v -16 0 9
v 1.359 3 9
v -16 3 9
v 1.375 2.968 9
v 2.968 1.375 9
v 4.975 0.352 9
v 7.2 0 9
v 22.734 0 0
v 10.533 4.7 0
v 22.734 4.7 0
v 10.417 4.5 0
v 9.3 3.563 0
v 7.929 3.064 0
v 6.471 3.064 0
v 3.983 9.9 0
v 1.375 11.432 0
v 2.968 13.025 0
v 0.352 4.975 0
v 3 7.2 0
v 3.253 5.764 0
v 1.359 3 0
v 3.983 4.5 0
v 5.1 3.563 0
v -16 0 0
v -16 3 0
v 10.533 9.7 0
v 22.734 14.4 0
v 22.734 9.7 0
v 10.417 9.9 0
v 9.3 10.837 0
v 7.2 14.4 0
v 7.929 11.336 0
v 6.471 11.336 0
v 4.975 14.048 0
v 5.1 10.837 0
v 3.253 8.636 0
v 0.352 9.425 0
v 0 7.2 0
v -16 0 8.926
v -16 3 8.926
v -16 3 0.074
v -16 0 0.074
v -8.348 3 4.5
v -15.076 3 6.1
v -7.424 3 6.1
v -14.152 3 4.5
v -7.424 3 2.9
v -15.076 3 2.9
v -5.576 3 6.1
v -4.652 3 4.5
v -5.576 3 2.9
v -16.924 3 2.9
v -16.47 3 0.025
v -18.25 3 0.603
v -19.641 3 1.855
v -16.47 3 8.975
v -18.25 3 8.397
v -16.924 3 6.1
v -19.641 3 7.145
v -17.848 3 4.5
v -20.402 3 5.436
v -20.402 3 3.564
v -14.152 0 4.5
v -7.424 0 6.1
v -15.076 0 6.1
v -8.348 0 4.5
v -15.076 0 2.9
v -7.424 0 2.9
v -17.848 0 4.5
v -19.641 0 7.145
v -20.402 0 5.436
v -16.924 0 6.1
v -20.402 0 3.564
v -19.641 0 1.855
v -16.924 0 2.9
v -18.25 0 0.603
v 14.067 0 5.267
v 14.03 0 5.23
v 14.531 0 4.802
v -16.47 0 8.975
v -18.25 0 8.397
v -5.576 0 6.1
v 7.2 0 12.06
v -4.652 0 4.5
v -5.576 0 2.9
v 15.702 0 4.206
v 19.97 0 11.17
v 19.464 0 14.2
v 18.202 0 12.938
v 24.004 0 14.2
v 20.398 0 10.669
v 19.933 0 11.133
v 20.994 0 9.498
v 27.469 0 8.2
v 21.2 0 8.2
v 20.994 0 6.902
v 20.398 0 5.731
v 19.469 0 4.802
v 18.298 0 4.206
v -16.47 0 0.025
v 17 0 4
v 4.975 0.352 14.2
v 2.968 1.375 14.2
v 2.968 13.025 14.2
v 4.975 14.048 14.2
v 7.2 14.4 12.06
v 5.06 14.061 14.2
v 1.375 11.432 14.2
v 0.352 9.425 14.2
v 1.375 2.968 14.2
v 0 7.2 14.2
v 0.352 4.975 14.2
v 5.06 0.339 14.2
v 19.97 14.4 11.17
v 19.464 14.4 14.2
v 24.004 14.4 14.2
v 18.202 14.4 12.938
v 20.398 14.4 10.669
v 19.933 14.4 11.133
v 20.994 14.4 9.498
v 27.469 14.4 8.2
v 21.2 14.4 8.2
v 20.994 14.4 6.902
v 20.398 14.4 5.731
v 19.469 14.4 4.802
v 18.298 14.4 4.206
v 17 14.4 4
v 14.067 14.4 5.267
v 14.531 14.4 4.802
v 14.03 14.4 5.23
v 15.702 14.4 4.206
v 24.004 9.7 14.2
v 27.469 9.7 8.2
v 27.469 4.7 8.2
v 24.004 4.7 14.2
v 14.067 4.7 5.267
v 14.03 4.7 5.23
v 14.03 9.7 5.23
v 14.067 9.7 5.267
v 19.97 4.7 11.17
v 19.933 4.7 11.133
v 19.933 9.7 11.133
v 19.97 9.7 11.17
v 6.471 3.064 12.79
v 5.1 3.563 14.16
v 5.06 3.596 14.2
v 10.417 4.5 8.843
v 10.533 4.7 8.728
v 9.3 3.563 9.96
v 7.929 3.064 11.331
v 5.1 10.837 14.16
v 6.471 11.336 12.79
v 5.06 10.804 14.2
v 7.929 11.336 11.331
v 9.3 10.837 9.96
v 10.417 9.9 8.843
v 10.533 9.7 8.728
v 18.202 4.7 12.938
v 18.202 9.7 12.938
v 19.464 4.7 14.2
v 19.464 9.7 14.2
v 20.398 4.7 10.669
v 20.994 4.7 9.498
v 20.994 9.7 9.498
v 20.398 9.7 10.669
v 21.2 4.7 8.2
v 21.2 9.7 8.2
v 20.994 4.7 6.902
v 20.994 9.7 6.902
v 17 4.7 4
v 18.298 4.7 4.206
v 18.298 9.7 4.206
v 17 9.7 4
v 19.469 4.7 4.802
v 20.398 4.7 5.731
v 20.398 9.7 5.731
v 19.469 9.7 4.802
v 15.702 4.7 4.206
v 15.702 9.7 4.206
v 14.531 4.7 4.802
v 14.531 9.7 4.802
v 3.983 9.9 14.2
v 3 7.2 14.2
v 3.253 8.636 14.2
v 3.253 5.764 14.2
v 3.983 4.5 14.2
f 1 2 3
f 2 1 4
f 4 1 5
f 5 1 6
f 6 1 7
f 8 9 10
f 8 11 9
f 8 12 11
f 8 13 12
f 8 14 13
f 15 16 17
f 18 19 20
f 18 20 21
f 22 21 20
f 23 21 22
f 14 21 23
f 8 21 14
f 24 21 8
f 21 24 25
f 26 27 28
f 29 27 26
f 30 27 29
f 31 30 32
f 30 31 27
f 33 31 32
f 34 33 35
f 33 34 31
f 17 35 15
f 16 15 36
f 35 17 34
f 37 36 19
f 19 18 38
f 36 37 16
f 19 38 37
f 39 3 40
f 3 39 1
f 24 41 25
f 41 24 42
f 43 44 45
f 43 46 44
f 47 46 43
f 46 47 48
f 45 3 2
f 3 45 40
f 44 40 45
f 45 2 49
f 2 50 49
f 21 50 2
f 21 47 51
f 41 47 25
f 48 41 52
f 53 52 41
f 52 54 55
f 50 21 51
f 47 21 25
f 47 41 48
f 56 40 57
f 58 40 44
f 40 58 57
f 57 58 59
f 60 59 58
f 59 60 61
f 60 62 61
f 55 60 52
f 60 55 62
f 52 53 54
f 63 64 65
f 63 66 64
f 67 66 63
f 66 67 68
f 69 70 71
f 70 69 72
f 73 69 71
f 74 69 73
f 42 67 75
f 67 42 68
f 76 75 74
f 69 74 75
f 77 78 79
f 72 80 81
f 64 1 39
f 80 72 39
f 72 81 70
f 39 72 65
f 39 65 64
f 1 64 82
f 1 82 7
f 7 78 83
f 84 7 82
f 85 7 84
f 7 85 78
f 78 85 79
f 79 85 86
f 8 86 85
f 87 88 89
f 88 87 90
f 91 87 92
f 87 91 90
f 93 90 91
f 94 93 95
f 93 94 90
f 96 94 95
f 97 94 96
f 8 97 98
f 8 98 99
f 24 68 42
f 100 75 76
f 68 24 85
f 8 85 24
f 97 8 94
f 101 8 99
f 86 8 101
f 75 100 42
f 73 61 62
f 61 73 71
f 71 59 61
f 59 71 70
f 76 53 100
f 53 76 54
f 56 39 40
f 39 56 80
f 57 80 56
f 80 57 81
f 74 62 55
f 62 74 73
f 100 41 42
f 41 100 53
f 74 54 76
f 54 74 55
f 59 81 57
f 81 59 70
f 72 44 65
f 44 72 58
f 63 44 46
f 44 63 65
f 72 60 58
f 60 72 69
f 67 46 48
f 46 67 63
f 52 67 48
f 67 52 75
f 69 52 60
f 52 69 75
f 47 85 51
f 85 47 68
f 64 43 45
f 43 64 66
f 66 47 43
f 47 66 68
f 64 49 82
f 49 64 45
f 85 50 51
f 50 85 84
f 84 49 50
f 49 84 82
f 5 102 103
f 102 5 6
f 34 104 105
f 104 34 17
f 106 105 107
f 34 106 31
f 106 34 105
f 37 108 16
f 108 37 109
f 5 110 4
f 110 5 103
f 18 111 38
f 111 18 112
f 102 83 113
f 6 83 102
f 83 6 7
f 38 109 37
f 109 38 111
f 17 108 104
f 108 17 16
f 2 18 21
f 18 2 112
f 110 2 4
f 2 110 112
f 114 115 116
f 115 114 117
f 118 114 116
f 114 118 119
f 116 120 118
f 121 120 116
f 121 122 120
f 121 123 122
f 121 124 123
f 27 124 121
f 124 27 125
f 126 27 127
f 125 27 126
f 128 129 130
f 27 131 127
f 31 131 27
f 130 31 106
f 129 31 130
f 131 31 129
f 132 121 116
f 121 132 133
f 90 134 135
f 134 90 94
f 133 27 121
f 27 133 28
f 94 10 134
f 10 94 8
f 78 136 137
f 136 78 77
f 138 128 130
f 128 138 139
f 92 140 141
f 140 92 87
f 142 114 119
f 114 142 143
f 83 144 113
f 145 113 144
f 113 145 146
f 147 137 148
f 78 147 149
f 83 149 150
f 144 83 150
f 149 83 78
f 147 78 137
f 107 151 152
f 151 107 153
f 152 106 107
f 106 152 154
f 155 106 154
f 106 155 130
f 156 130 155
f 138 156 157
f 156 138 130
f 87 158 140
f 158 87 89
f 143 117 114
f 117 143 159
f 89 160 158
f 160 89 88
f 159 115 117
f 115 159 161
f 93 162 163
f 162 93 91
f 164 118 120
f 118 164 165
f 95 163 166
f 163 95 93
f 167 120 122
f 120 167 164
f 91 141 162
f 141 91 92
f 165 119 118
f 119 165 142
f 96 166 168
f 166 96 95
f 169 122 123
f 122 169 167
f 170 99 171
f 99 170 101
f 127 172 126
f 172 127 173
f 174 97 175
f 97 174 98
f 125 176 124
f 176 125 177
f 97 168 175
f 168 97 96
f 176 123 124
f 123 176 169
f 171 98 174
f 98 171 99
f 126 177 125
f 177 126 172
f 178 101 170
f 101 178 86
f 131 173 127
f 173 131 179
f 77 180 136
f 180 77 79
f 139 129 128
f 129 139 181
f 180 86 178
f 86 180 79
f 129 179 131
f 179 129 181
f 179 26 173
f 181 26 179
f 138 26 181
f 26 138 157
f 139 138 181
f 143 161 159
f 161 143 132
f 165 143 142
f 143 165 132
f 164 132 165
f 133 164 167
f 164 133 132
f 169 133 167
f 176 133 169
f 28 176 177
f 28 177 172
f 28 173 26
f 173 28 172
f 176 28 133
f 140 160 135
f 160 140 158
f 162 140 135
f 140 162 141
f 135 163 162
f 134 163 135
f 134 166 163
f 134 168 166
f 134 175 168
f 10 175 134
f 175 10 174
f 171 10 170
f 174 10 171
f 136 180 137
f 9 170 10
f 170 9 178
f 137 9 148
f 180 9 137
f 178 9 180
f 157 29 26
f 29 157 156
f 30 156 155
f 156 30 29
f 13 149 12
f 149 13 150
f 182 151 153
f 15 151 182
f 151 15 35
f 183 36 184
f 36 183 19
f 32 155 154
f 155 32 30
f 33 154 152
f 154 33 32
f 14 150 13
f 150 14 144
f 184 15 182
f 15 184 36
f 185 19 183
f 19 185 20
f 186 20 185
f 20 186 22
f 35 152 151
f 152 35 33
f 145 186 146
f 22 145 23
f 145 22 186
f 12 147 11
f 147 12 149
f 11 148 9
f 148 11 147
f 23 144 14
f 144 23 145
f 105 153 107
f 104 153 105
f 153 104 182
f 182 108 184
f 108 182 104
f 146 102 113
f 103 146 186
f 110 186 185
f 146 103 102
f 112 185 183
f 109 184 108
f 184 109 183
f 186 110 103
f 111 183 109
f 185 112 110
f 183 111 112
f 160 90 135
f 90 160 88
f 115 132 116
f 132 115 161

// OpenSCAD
// file: functions.scad
// PRUSA Mendel  
// Functions used in many files
// GNU GPL v3
// Josef Průša
// josefprusa@me.com
// prusadjs.cz
// http://www.reprap.org/wiki/Prusa_Mendel
// http://github.com/prusajr/PrusaMendel


module nut(d,h,horizontal=true){
cornerdiameter =  (d / 2) / cos (180 / 6);
cylinder(h = h, r = cornerdiameter, $fn = 6);
if(horizontal){
for(i = [1:6]){
	rotate([0,0,60*i]) translate([-cornerdiameter-0.2,0,0]) rotate([0,0,-45]) cube(size = [2,2,h]);
}}
}

// Based on nophead research
module polyhole(d,h) {
    n = max(round(2 * d),3);
    rotate([0,0,180])
        cylinder(h = h, r = (d / 2) / cos (180 / n), $fn = n);
}




module roundcorner(diameter){
	difference(){
		cube(size = [diameter,diameter,99], center = false);
		translate(v = [diameter, diameter, 0]) cylinder(h = 100, r=diameter, center=false,$fn = max(3*diameter,20));
	}
}

module t25_indent()
{
	union()
	{
		for(z=[-5:5])
			translate([0,-5,z*2.5])
				difference()
				{
					cube([30,10,1.25],center=true);
					translate([0, 5, 1.7])
						rotate([-45,0,0])
							cube([40,10,2],center=true);
					translate([0, 5, -1.7])
						rotate([45,0,0])
							cube([40,10,2],center=true);

				}
	}
}
// file: configuration.scad
// PRUSA Mendel  
// Configuration file
// GNU GPL v2
// Josef Pra
// josefprusa@me.com
// prusadjs.cz
// http://www.reprap.org/wiki/Prusa_Mendel
// http://github.com/prusajr/PrusaMendel


// PLEASE SELECT ONE OF THE CONFIGURATIONS BELOW
// BY UN-COMMENTING IT


variant=0; //0 for metric
//variant=1; //1 for SAE
if(variant==0){
echo("variant: metric");
}else if(variant==1){
echo("variant: sae");
} else{
echo("WARNING: INVALID CONFIGURATION");
}




vars=[
//[m8_dia,m8_nut, m4_dia, m4_nut, m3_dia, m3_nut, bush_dia, mot_shaft, bush_rod, bush_outerdia, bush_length, m5_dia, m5_nut]
[8.4, 14.8, 4.3,8.1, 3.1, 6.5, 11, 5.3, 8, 16, 11, 5.3,9.3],//metric - M3 nut was 7; M3 was 4.4
[9,15.7,5.5,10.6,5.5,10.6,11.5,5.3,7.9375,16,11,5.6, 10]//SAE
];


//BUSHING TYPE Can generate three versions
// 1 - regular old ones
// 2 - helical ones
// 3 - holders for brass or any other bought bushings
bushing_type = 2;


//Round corner diameter
round_corner_diameter = 8;


//Thin wall size
layer_height = 0.4;
perimeter_width_over_thicknes = 1.6;
infill_widht_over_thickness = 1.55;
thin_wall = 2*(perimeter_width_over_thicknes*layer_height+infill_widht_over_thickness*layer_height);
if(thin_wall<2){
	echo("Check thin wall size, its below 2mm!");
}
echo(thin_wall);


//DO NOT TOUCH THIS SECTION!
m8_diameter = vars[variant][0];
m8_nut_diameter = vars[variant][1];
m4_diameter = vars[variant][2];
m4_nut_diameter = vars[variant][3];
m3_diameter = vars[variant][4];
m3_nut_diameter = vars[variant][5];
bushing_diameter = vars[variant][6];
motor_shaft=vars[variant][7];
bushing_rodsize = vars[variant][8];
bushing_outerDiameter = vars[variant][9];
bushing_lenght = vars[variant][10];
m5_diameter = vars[variant][11];
m5_nut_diameter = vars[variant][12];



// MINI-HUXLEY VERSION (TODO, just place holder)
// include <configuration-huxley.scad>


// MEGA VERSION (TODO, just place holder)
// include <configuration-mega.scad>

// Gap between the X rods

x_rod_centres=70;
y_rod_centres=183;
belt_width=6;
belt_clamp_centres=18;
ptfe_diameter=4;
z_slot_width=3.5;

vertex_x_rod_1=[11.013,59.912];
vertex_x_rod_2=[40.274,9.249,0];
vertex_x_rod_gap=sqrt((vertex_x_rod_1.x-vertex_x_rod_2.x)*(vertex_x_rod_1.x-vertex_x_rod_2.x) +(vertex_x_rod_1.y-vertex_x_rod_2.y)*(vertex_x_rod_1.y-vertex_x_rod_2.y) );

// Some basic functions, probably should be somewhere else
module roundcorner(diameter){
	difference(){
		cube(size = [diameter,diameter,99], center = false);
		translate(v = [diameter, diameter, 0]) cylinder(h = 100, r=diameter, center=true);
	}
}

include <functions.scad>
// main file
// PRUSA Mendel  
// Bar clamp
// Used for joining 8mm rods
// GNU GPL v3
// Josef Průša
// josefprusa@me.com
// prusadjs.cz
// http://www.reprap.org/wiki/Prusa_Mendel
// http://github.com/prusajr/PrusaMendel

include <configuration.scad>

/**
 * @id bar-clamp
 * @name Bar clamp
 * @category Printed
 * @using 2 m8nut
 * @using 2 m8washer
 */ 

module barclamp(){
outer_diameter_y = (m8_diameter-0.0)/2+3;
outer_diameter_z =outer_diameter_y+1;
t=true;

difference(){
	union(){
		
		translate([outer_diameter_y, outer_diameter_y, 0])cylinder(h =outer_diameter_z*2, r = outer_diameter_y, $fn = 20);
		translate([outer_diameter_y, 0, 0])cube([outer_diameter_y+1.5,outer_diameter_y*2,outer_diameter_z*2]);
		translate([18, 2*outer_diameter_y, outer_diameter_z])rotate([90, 0, 0]) rotate([0, 0, 0]) nut(outer_diameter_z*2,outer_diameter_y*2,false);
		if(t) tongue();
	}


	translate([19, outer_diameter_y, 9])cube([19,5,20], center=true);
	translate([outer_diameter_y, outer_diameter_y, -1]) cylinder(h =20, r = m8_diameter/2, $fn = 18);
	translate([17, 17, outer_diameter_z]) rotate([90, 0, 0]) union() {
		cylinder(h =20, r = m8_diameter/2, $fn = 20);
		rotate([0,0,135]) translate([m8_diameter,0,10]) {
			cube([m8_diameter*2,m8_diameter,20],center=true);
			translate([-m8_diameter/2+2.5,-m8_diameter,0]) cube([m8_diameter,m8_diameter*2,20],center=true);
		}
	}
	translate([0, -0.1, outer_diameter_z+6])cube([35,16,20]);
}
}
tHeight=9;
module tongue()
{
	translate([-16,0,0]) difference() {
		union() {
			cube([26,3,tHeight]);
			translate([0,0,tHeight/2]) rotate([-90,0,0]) cylinder(r=tHeight/2,h=3);
		}
		for(i=[0,9.5]) {
			translate([i,-0.1,tHeight/2]) rotate([-90,0,0]) polyhole(d=3.2,h=6.2);
		}
	}
}
barclamp();
